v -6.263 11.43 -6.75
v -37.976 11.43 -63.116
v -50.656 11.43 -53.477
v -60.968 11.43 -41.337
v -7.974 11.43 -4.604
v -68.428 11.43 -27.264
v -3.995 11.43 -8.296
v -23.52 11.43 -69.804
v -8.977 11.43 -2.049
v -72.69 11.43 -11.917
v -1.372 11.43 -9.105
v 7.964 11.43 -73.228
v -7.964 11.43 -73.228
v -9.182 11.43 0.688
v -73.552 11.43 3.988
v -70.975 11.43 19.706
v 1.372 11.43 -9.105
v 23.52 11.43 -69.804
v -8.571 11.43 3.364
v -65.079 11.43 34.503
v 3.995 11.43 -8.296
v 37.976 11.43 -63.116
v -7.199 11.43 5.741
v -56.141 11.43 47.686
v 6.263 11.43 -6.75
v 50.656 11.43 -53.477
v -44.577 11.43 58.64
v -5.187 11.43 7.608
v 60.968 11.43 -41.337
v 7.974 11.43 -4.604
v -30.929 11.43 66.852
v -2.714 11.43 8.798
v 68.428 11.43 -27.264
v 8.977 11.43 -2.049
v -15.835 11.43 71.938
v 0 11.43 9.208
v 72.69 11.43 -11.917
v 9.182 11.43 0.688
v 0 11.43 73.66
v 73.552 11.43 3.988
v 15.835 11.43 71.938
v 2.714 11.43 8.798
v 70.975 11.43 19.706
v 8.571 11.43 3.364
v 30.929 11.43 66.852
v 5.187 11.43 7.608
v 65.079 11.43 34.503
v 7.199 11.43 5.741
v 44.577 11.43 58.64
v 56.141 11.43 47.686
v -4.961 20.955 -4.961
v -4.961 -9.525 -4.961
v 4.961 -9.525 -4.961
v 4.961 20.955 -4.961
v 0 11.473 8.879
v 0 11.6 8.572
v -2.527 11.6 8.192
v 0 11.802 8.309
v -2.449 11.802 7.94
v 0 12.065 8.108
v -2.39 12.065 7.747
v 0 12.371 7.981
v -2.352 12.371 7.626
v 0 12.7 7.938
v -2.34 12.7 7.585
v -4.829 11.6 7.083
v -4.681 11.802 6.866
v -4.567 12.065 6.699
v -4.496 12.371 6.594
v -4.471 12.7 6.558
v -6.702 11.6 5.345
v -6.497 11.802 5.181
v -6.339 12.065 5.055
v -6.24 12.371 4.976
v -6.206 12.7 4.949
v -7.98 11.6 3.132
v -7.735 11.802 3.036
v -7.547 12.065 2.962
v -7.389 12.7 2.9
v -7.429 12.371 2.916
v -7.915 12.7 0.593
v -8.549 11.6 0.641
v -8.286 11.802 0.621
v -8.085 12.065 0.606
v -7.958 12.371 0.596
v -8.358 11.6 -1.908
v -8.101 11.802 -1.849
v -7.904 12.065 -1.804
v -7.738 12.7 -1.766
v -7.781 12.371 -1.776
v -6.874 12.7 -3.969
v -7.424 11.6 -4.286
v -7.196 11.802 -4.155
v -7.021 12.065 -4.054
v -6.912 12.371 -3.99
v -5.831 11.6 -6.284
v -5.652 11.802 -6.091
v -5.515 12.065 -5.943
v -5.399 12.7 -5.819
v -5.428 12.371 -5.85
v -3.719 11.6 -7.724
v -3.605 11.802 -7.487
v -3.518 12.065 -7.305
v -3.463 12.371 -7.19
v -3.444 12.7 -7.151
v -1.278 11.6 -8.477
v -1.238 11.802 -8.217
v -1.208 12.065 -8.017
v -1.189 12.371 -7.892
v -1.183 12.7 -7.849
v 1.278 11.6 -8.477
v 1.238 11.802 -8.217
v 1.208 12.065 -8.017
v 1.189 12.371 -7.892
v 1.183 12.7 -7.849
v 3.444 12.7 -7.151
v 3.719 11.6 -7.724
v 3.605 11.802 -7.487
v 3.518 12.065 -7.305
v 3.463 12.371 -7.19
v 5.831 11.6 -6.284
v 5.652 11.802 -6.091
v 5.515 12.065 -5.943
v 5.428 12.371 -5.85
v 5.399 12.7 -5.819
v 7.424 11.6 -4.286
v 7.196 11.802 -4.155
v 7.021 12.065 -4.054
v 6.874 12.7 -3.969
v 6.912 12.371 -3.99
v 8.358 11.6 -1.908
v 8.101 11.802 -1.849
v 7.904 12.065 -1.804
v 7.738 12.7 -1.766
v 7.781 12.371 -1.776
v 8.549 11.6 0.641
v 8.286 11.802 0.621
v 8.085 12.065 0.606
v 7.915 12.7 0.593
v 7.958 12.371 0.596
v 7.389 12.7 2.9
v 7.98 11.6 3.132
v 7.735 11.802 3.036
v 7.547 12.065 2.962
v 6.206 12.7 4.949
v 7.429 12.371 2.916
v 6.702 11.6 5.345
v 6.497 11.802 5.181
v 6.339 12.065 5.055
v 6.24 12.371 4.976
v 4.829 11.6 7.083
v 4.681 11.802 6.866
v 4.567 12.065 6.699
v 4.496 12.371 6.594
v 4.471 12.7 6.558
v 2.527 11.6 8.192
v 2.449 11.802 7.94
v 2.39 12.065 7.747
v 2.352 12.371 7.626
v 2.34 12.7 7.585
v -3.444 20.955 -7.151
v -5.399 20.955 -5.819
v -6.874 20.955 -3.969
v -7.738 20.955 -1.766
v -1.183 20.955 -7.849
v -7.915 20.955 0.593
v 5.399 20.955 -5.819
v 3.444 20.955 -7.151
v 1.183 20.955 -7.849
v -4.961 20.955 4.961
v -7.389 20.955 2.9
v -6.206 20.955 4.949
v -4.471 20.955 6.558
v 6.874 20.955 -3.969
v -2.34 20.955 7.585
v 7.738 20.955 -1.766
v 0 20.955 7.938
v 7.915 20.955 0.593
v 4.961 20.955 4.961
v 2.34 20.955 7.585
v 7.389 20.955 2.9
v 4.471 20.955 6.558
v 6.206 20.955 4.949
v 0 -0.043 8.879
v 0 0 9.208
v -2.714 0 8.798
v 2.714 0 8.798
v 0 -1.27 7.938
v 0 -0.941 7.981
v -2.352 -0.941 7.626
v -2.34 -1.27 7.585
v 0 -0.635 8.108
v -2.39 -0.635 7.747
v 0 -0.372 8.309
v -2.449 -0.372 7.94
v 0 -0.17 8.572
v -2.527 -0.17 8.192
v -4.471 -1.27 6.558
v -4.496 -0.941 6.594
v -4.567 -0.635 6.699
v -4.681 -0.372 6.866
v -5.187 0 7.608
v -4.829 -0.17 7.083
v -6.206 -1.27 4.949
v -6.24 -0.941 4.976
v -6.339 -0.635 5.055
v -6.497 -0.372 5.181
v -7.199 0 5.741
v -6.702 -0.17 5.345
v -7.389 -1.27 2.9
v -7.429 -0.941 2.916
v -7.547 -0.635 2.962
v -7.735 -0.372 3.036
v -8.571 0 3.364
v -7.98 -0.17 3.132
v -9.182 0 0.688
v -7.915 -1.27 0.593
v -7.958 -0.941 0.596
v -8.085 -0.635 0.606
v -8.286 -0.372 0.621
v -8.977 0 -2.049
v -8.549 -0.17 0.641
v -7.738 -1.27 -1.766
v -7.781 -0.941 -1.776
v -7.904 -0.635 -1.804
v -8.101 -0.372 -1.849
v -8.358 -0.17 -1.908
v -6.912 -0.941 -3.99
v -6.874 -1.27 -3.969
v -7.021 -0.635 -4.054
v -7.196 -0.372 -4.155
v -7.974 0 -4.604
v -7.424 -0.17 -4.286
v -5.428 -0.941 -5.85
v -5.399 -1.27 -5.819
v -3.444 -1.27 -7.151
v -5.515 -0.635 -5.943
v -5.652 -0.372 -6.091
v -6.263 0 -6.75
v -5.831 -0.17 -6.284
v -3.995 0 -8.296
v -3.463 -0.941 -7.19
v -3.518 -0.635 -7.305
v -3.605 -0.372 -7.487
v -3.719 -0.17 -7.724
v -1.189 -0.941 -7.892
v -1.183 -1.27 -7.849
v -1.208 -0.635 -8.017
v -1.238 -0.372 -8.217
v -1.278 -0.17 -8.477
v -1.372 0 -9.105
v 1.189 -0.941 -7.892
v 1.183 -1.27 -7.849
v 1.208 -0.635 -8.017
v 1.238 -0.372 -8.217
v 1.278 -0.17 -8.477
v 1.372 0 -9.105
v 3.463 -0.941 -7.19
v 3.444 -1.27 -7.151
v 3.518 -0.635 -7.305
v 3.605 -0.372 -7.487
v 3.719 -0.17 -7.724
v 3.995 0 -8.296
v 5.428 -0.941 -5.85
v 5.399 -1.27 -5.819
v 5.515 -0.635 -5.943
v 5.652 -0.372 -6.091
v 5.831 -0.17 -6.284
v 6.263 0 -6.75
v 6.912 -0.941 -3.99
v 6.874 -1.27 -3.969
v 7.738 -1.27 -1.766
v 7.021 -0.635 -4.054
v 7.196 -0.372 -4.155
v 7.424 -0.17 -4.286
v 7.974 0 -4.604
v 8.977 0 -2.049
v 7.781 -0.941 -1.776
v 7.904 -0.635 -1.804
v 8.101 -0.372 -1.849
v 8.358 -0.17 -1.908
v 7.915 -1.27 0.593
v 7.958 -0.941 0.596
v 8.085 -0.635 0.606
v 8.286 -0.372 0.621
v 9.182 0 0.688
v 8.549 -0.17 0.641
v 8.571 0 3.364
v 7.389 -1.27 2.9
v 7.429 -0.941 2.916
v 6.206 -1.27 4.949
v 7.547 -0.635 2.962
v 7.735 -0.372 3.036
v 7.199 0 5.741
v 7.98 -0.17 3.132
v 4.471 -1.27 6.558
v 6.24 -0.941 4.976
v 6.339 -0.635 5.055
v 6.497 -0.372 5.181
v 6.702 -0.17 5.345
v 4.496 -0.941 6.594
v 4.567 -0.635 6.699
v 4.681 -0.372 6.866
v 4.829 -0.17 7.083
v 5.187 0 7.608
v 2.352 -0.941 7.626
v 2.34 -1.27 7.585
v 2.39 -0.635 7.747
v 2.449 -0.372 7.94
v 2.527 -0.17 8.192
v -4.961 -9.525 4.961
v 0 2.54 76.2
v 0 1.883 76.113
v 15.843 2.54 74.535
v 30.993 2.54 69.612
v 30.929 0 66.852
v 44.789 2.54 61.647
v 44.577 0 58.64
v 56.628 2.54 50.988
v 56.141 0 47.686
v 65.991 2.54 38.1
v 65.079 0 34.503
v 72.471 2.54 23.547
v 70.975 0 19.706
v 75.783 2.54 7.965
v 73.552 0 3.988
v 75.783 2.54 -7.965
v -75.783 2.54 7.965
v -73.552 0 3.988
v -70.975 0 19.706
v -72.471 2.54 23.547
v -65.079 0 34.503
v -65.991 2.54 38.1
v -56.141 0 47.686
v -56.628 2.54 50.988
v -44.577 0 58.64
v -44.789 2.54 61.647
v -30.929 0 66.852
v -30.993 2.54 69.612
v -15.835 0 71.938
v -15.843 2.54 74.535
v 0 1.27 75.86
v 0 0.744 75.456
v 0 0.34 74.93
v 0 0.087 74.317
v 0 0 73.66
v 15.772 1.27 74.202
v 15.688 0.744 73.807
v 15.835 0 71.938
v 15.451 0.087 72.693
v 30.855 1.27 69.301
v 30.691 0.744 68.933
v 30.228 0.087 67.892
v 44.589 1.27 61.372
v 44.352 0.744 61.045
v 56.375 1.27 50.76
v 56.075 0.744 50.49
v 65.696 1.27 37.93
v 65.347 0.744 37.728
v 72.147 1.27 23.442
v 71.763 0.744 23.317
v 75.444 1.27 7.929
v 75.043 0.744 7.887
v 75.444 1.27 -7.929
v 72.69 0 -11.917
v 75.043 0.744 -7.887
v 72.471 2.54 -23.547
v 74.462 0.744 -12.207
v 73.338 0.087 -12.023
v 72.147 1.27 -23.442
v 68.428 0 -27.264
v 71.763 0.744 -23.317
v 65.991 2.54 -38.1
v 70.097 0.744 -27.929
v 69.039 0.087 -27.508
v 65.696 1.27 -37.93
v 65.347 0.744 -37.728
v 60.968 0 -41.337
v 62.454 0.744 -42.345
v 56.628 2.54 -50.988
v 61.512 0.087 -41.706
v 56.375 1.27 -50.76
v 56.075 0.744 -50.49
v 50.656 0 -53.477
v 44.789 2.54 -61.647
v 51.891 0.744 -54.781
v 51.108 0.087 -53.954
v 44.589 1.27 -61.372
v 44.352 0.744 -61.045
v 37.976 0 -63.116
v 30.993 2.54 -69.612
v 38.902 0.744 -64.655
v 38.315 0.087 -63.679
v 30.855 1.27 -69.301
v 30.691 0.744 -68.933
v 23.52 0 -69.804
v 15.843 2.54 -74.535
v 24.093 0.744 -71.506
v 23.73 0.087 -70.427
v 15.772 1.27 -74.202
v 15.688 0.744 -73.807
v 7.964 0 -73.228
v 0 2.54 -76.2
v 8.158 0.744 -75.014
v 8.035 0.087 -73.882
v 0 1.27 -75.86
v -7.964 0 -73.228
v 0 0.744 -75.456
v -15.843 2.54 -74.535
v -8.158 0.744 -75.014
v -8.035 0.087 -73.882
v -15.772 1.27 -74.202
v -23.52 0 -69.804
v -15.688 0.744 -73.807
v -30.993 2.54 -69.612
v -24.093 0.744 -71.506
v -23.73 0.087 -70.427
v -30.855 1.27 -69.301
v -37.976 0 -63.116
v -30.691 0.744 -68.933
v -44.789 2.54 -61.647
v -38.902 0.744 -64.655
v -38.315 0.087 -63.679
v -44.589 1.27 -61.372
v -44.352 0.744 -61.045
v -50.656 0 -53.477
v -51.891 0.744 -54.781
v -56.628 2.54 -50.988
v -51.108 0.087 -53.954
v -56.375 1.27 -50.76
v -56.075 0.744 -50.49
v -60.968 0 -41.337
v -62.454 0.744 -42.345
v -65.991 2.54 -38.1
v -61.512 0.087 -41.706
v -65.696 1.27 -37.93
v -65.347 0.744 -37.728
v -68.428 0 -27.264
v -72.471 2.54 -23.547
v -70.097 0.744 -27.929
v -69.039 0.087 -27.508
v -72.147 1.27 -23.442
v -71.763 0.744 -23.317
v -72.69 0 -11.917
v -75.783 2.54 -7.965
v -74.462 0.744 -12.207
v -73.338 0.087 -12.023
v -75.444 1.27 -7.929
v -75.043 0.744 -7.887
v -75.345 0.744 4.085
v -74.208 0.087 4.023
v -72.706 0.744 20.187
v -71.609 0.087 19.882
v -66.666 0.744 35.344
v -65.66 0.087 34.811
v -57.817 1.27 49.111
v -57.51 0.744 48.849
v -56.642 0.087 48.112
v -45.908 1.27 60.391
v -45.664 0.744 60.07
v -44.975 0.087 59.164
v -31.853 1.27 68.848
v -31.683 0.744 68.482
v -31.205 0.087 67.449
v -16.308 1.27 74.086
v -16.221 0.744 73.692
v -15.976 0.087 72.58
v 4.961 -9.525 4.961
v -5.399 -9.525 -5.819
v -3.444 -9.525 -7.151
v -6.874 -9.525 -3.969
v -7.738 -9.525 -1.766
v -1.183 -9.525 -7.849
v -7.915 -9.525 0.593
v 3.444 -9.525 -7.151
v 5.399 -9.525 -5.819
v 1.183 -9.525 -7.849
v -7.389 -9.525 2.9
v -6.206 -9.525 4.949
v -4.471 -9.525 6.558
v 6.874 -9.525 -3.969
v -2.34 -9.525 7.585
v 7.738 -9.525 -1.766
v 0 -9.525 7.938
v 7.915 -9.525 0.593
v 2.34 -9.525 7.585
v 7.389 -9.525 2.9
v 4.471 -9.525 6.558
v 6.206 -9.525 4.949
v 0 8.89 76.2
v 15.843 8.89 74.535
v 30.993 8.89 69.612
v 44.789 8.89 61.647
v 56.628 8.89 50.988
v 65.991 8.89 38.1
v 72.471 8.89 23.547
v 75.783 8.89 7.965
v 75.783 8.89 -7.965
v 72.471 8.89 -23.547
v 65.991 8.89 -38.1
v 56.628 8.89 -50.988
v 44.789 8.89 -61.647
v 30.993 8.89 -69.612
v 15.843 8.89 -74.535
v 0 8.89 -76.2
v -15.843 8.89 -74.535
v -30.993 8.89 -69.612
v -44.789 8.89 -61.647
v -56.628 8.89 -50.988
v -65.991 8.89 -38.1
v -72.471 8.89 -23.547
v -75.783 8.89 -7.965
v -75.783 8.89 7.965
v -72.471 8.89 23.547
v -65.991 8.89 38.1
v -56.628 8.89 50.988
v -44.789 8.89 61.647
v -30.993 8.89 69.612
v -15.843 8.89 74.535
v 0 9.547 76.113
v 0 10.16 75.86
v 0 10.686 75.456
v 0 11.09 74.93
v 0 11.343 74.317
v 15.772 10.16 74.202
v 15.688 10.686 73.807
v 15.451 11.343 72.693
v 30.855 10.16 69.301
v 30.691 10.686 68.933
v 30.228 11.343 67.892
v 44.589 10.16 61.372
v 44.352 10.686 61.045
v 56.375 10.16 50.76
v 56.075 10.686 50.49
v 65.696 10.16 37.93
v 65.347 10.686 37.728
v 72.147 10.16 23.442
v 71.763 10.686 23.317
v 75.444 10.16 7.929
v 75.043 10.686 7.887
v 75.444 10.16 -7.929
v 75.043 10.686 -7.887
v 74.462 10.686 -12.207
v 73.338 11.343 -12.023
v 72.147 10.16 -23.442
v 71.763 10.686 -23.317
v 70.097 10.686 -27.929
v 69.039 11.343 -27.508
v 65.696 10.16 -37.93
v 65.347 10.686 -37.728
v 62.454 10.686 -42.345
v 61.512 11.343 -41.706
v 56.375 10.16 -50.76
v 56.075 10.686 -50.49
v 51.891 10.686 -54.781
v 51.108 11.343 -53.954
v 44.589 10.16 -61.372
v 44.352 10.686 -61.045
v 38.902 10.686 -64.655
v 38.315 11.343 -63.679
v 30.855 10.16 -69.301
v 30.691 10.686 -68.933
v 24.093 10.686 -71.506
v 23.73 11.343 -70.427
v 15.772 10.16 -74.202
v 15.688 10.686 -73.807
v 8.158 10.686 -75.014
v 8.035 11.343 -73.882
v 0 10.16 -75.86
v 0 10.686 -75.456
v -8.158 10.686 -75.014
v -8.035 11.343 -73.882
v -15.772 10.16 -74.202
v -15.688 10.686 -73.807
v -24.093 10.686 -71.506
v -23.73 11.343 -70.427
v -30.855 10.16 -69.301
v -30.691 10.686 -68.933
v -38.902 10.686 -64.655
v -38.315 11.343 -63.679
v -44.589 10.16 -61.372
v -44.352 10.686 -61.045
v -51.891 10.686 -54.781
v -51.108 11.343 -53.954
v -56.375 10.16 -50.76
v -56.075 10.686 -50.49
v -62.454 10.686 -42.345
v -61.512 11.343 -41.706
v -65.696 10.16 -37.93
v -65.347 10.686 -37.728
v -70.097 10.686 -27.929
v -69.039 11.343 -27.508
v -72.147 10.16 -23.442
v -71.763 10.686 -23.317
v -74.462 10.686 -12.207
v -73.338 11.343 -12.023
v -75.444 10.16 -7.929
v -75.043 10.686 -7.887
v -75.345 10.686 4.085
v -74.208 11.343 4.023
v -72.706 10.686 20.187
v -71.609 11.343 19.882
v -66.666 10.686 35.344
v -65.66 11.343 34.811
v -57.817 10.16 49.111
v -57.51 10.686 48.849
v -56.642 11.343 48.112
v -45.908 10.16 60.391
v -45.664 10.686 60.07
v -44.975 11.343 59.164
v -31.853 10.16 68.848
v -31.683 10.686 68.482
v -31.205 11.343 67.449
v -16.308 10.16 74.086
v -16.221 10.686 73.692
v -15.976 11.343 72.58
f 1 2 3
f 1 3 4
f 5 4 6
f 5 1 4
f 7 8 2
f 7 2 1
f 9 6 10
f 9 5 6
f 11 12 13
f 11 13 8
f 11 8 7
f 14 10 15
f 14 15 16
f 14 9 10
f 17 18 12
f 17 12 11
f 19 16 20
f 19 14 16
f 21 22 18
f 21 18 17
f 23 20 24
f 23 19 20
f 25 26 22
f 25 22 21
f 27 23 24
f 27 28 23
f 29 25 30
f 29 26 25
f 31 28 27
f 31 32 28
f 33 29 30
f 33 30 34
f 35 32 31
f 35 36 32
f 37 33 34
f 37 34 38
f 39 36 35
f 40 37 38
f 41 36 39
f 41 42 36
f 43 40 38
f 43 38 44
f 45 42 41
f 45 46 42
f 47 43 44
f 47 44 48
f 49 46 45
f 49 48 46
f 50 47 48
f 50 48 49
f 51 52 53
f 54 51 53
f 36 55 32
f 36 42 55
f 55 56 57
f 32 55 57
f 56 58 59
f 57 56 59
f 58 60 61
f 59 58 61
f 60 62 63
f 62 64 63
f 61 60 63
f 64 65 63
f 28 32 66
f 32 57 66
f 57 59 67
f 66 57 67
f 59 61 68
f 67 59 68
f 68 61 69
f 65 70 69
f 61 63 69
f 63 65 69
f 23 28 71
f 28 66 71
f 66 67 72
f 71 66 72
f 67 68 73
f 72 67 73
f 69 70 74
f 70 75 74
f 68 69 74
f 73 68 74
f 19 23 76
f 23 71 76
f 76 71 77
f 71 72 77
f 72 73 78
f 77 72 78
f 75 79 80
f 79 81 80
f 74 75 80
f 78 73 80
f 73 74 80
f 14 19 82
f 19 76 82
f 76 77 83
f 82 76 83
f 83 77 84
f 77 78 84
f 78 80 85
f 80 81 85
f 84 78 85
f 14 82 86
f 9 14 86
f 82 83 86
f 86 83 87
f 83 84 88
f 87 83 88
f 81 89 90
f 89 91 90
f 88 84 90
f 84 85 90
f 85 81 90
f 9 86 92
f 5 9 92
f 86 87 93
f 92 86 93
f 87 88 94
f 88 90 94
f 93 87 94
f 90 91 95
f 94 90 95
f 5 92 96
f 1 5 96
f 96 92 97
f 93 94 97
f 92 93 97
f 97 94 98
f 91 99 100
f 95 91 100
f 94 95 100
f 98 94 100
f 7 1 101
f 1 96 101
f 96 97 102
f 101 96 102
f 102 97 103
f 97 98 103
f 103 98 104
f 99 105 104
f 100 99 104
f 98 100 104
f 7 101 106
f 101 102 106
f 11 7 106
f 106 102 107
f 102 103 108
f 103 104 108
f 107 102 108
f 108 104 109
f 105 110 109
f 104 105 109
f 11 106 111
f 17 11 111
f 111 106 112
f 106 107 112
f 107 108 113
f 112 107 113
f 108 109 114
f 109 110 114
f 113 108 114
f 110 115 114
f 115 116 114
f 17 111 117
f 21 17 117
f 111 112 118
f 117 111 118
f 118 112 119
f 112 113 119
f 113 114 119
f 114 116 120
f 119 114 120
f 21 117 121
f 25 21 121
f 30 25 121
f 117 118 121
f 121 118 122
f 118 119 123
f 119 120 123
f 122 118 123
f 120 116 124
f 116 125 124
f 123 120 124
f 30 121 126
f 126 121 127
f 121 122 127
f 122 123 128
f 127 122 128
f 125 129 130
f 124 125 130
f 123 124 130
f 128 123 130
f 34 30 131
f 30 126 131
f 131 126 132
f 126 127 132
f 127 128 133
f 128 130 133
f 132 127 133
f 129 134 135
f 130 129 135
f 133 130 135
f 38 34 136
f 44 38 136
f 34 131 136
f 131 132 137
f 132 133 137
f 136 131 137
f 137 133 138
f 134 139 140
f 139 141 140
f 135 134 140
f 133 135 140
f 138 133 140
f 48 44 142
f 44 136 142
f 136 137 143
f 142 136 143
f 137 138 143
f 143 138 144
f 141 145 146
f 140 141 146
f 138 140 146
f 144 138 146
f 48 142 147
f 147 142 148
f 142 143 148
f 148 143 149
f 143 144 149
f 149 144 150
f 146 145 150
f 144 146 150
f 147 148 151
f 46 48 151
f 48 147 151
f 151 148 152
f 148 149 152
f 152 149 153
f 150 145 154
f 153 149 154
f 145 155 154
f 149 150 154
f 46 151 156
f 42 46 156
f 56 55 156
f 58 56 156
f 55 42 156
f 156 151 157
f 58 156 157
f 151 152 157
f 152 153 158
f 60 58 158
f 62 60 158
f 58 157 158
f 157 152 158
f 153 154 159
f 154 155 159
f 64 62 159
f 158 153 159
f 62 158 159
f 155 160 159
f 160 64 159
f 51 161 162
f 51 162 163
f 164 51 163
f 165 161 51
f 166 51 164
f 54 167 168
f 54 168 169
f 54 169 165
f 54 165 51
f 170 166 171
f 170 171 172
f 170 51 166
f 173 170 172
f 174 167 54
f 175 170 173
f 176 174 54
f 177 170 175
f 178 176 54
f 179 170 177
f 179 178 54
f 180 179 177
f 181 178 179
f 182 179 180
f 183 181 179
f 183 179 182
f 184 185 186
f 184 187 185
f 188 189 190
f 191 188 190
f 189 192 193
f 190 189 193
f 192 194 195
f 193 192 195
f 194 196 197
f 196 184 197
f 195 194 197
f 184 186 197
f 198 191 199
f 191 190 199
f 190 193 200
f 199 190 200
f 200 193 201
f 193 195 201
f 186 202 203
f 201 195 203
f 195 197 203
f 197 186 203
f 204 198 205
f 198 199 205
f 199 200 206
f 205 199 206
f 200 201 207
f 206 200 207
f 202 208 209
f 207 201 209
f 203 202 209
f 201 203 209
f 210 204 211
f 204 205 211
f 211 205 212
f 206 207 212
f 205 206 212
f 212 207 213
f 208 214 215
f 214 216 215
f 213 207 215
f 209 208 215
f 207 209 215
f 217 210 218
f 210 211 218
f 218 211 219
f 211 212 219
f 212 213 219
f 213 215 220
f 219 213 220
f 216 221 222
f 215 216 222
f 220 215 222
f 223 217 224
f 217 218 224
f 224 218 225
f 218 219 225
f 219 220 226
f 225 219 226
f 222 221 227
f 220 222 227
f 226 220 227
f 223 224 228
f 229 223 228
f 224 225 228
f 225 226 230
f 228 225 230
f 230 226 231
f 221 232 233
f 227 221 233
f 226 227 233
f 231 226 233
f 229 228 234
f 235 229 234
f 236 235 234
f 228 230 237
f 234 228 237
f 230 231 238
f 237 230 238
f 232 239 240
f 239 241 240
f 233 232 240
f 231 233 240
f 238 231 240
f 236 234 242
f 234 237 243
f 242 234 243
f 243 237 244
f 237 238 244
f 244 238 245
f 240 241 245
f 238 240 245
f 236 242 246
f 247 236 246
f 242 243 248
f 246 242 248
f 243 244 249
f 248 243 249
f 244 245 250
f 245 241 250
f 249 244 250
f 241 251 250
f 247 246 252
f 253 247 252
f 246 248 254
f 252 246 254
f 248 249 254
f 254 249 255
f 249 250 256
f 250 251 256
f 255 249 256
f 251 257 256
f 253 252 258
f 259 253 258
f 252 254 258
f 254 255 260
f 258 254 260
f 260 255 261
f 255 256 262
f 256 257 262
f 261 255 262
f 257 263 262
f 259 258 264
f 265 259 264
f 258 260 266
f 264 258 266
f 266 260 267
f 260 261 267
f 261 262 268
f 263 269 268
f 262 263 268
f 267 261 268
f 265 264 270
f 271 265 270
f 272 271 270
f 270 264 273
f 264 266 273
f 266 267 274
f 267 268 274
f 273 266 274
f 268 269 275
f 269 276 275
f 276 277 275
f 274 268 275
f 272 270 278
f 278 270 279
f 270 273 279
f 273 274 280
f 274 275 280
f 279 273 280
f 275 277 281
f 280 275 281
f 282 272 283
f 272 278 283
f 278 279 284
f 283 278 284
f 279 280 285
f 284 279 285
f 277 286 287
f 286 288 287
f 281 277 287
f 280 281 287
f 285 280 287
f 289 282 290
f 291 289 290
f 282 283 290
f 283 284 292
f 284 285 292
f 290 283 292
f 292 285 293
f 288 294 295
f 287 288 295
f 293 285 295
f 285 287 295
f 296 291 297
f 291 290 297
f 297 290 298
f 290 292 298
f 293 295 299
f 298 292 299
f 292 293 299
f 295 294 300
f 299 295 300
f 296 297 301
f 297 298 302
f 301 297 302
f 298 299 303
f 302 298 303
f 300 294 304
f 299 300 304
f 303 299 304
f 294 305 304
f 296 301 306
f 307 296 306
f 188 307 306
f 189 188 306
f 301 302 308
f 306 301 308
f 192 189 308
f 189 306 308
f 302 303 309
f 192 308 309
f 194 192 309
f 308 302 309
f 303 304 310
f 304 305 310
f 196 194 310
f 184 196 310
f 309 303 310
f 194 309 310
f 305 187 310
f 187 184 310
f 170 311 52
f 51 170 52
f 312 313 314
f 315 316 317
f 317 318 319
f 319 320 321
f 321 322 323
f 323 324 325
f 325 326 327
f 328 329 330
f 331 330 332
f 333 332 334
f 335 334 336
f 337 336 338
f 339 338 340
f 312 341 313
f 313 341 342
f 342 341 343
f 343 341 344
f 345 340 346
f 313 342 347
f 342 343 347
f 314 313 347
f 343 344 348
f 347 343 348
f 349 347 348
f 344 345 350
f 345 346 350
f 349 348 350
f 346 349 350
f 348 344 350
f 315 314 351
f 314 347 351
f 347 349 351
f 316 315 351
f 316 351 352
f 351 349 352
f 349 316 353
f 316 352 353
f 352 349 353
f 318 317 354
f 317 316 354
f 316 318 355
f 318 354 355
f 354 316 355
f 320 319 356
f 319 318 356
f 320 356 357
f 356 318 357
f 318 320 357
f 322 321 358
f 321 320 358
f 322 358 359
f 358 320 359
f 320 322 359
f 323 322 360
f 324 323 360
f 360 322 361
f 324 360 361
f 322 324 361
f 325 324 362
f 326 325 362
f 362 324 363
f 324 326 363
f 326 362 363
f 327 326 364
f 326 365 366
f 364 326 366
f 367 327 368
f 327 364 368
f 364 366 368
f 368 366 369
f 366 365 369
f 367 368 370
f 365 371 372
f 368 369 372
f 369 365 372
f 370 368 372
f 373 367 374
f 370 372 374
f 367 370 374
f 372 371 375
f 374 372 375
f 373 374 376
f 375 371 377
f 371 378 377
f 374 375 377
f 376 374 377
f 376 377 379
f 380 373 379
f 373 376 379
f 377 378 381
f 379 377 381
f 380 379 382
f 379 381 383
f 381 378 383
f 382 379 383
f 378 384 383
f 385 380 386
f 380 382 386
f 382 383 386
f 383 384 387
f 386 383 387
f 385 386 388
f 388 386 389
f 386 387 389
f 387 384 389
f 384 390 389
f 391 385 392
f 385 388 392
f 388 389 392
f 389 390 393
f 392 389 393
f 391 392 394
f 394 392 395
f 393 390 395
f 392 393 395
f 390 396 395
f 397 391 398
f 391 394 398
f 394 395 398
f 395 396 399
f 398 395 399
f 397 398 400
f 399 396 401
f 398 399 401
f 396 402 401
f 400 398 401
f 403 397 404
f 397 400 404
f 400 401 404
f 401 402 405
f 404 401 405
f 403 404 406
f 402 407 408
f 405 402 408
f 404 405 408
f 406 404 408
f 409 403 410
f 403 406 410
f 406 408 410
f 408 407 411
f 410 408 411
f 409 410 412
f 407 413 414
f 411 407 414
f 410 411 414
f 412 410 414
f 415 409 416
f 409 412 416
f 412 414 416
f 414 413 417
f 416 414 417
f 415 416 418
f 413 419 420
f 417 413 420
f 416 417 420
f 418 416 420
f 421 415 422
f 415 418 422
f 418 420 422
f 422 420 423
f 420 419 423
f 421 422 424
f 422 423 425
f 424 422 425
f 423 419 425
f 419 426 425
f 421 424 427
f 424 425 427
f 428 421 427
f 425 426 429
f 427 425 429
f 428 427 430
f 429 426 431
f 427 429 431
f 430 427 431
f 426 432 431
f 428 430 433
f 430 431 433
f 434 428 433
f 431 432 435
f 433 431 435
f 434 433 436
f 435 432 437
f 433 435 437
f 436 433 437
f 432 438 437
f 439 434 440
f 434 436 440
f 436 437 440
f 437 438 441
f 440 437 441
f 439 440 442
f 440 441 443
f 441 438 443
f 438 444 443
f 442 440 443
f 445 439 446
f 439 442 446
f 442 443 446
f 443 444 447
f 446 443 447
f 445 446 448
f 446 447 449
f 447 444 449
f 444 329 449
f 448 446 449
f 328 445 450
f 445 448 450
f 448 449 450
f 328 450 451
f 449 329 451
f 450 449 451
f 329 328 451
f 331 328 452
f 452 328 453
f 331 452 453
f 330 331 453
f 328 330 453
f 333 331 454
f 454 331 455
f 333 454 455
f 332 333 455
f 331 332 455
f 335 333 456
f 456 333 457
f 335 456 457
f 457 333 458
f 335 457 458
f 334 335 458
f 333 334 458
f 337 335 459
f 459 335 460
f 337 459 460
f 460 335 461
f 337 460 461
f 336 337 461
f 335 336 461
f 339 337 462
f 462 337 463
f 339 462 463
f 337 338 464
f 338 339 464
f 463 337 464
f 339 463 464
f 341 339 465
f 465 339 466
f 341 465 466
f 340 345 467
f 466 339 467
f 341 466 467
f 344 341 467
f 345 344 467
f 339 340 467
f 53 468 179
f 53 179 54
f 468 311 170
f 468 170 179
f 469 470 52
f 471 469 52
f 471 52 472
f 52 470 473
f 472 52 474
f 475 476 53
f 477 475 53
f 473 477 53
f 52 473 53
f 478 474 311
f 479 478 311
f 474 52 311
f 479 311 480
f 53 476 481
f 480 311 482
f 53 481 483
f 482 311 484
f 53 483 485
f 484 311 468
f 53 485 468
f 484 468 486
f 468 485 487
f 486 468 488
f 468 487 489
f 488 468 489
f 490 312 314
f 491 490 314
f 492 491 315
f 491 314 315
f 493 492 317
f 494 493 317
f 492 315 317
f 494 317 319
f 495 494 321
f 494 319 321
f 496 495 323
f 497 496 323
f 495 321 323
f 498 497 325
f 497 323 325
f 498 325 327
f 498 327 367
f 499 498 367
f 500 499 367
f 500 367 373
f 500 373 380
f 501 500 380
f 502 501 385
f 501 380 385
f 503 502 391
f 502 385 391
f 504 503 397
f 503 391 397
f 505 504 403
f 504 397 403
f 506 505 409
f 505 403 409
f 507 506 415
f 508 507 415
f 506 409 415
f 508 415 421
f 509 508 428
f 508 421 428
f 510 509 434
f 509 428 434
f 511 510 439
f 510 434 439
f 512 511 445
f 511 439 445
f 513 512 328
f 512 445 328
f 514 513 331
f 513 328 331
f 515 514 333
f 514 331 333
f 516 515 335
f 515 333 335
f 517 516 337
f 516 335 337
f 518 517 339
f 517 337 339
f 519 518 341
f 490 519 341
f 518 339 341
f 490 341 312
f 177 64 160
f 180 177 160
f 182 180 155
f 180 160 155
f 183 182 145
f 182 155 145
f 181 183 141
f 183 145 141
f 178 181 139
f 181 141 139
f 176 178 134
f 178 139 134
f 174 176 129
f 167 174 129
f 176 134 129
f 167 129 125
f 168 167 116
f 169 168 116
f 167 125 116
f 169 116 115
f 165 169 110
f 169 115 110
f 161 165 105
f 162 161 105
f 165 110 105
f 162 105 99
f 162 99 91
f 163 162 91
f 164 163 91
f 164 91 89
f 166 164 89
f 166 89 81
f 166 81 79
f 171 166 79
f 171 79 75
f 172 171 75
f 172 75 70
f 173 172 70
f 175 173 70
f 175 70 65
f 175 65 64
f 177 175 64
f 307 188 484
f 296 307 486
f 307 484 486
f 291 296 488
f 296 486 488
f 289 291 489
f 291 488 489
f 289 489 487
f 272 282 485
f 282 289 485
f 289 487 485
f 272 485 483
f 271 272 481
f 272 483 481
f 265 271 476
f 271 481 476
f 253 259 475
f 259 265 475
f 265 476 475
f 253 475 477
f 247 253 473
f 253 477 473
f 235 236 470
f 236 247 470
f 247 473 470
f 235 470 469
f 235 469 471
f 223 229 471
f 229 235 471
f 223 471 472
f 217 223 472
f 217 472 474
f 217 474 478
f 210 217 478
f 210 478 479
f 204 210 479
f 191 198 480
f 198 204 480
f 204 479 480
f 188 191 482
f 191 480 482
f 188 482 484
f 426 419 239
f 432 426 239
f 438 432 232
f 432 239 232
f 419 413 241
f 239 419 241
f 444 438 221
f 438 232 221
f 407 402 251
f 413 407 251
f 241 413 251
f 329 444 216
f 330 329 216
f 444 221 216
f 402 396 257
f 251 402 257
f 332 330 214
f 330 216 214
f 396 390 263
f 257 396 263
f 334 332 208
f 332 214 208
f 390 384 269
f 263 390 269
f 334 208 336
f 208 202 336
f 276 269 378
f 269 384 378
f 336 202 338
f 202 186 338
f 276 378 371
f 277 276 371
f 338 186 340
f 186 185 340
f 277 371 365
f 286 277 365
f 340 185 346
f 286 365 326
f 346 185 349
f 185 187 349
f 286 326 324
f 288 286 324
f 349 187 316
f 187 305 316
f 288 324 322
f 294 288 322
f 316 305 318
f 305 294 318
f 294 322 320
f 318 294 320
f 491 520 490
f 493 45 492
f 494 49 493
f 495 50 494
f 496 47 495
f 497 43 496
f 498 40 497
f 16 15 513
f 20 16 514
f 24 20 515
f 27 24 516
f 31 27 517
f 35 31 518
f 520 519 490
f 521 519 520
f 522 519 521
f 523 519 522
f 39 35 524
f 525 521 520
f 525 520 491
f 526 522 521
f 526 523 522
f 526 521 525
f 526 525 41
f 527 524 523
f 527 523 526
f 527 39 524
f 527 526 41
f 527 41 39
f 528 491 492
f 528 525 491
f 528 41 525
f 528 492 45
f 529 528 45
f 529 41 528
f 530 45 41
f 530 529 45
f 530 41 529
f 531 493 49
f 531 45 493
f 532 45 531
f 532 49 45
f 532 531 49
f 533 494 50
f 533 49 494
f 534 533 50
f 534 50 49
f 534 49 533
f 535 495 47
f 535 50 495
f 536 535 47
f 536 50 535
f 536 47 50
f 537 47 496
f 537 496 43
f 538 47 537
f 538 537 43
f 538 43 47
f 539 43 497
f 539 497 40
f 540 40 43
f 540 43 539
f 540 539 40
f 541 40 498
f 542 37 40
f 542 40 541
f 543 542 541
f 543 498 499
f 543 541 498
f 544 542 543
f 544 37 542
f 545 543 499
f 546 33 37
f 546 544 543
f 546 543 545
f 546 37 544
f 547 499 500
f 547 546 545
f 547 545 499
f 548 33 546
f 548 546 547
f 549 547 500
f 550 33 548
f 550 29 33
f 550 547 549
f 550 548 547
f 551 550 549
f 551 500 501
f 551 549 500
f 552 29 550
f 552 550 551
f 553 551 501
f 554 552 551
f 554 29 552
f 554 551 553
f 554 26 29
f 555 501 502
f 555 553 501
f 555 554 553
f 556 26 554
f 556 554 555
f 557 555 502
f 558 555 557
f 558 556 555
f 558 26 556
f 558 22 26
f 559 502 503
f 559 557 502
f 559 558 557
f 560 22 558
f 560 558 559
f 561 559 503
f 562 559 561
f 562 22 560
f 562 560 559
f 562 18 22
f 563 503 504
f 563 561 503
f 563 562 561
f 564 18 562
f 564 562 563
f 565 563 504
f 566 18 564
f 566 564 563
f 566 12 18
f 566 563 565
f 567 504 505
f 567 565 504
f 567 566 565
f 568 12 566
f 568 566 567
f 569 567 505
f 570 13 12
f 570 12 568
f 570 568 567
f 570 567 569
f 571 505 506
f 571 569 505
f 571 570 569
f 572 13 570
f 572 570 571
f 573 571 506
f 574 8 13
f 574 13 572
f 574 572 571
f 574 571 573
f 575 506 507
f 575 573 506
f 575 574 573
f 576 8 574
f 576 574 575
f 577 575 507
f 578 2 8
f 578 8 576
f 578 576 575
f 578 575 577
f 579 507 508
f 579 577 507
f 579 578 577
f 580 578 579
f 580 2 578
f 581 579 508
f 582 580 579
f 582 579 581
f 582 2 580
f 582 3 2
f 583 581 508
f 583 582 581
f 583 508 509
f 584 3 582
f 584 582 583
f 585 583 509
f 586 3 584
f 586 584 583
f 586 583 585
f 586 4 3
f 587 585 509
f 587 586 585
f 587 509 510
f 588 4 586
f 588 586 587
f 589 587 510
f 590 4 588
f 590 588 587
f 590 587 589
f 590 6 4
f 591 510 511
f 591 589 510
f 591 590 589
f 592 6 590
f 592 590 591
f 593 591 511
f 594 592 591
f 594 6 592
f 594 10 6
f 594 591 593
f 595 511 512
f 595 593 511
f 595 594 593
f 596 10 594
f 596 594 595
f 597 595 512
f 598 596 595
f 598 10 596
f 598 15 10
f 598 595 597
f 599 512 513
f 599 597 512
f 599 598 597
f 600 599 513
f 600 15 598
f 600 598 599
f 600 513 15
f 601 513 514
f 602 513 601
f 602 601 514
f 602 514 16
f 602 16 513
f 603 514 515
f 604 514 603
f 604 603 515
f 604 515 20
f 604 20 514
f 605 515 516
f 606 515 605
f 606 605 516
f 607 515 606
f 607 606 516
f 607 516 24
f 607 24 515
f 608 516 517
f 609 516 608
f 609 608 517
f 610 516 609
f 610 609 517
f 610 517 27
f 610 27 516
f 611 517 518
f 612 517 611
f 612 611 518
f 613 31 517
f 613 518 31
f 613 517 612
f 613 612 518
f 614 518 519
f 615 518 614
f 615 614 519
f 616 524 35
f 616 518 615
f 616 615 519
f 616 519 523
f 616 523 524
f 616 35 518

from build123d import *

# Parameters (mm, degrees)
SKETCH1_R                = 76.2
BOSS_EXTRUDE1_DEPTH      = 11.43
FILLET1_R                = 2.54
BOSS_EXTRUDE2_DEPTH      = 9.525
BOSS_EXTRUDE2_DEPTH_BACK = 20.955
SKETCH3_R                = 7.9375
FILLET2_R                = 1.27
CUT_EXTRUDE1_DEPTH       = 110.78156512
CUT_EXTRUDE1_DEPTH_BACK  = 110.78156512
SKETCH2_W                = 9.921875
SKETCH2_H                = 9.921875


with BuildPart() as part:
    # Sketch1 → Boss-Extrude1 (new body)
    with BuildSketch(Plane(origin=(0, 0, 0), x_dir=(1, 0, 0), z_dir=(0, 1, 0))):
        with Locations(Location((0, 0, 0), (0, 0, 270))):
            Circle(SKETCH1_R)
    extrude(amount=BOSS_EXTRUDE1_DEPTH)

    # Fillet1
    fillet1_edges = [part.edges().sort_by_distance(p)[0] for p in [
        (0, 0, -76.2),
        (0, 11.43, -76.2),
    ]]
    fillet(fillet1_edges, radius=FILLET1_R)

    # Sketch3 → Boss-Extrude2 (add, two sides: drawn at the far end of the back side and taken through both)
    with BuildSketch(Plane(origin=(0, 11.43, 0), x_dir=(1, 0, 0), z_dir=(0, 1, 0)).offset(-BOSS_EXTRUDE2_DEPTH_BACK)):
        with Locations(Location((0, 0, 0), (0, 0, 270))):
            Circle(SKETCH3_R)
    extrude(amount=BOSS_EXTRUDE2_DEPTH + BOSS_EXTRUDE2_DEPTH_BACK)

    # Fillet2
    fillet2_edges = [part.edges().sort_by_distance(p)[0] for p in [
        (0, 11.43, -7.9375),
        (0, 0, -7.9375),
    ]]
    fillet(fillet2_edges, radius=FILLET2_R)

    # Sketch2 → Cut-Extrude1 (cut, two sides: drawn at the far end of the back side and taken through both)
    with BuildSketch(Plane(origin=(0, 11.43, 0), x_dir=(1, 0, 0), z_dir=(0, 1, 0)).offset(-CUT_EXTRUDE1_DEPTH_BACK)):
        Rectangle(SKETCH2_W, SKETCH2_H)
    extrude(amount=CUT_EXTRUDE1_DEPTH + CUT_EXTRUDE1_DEPTH_BACK, mode=Mode.SUBTRACT)


solid = part.part
